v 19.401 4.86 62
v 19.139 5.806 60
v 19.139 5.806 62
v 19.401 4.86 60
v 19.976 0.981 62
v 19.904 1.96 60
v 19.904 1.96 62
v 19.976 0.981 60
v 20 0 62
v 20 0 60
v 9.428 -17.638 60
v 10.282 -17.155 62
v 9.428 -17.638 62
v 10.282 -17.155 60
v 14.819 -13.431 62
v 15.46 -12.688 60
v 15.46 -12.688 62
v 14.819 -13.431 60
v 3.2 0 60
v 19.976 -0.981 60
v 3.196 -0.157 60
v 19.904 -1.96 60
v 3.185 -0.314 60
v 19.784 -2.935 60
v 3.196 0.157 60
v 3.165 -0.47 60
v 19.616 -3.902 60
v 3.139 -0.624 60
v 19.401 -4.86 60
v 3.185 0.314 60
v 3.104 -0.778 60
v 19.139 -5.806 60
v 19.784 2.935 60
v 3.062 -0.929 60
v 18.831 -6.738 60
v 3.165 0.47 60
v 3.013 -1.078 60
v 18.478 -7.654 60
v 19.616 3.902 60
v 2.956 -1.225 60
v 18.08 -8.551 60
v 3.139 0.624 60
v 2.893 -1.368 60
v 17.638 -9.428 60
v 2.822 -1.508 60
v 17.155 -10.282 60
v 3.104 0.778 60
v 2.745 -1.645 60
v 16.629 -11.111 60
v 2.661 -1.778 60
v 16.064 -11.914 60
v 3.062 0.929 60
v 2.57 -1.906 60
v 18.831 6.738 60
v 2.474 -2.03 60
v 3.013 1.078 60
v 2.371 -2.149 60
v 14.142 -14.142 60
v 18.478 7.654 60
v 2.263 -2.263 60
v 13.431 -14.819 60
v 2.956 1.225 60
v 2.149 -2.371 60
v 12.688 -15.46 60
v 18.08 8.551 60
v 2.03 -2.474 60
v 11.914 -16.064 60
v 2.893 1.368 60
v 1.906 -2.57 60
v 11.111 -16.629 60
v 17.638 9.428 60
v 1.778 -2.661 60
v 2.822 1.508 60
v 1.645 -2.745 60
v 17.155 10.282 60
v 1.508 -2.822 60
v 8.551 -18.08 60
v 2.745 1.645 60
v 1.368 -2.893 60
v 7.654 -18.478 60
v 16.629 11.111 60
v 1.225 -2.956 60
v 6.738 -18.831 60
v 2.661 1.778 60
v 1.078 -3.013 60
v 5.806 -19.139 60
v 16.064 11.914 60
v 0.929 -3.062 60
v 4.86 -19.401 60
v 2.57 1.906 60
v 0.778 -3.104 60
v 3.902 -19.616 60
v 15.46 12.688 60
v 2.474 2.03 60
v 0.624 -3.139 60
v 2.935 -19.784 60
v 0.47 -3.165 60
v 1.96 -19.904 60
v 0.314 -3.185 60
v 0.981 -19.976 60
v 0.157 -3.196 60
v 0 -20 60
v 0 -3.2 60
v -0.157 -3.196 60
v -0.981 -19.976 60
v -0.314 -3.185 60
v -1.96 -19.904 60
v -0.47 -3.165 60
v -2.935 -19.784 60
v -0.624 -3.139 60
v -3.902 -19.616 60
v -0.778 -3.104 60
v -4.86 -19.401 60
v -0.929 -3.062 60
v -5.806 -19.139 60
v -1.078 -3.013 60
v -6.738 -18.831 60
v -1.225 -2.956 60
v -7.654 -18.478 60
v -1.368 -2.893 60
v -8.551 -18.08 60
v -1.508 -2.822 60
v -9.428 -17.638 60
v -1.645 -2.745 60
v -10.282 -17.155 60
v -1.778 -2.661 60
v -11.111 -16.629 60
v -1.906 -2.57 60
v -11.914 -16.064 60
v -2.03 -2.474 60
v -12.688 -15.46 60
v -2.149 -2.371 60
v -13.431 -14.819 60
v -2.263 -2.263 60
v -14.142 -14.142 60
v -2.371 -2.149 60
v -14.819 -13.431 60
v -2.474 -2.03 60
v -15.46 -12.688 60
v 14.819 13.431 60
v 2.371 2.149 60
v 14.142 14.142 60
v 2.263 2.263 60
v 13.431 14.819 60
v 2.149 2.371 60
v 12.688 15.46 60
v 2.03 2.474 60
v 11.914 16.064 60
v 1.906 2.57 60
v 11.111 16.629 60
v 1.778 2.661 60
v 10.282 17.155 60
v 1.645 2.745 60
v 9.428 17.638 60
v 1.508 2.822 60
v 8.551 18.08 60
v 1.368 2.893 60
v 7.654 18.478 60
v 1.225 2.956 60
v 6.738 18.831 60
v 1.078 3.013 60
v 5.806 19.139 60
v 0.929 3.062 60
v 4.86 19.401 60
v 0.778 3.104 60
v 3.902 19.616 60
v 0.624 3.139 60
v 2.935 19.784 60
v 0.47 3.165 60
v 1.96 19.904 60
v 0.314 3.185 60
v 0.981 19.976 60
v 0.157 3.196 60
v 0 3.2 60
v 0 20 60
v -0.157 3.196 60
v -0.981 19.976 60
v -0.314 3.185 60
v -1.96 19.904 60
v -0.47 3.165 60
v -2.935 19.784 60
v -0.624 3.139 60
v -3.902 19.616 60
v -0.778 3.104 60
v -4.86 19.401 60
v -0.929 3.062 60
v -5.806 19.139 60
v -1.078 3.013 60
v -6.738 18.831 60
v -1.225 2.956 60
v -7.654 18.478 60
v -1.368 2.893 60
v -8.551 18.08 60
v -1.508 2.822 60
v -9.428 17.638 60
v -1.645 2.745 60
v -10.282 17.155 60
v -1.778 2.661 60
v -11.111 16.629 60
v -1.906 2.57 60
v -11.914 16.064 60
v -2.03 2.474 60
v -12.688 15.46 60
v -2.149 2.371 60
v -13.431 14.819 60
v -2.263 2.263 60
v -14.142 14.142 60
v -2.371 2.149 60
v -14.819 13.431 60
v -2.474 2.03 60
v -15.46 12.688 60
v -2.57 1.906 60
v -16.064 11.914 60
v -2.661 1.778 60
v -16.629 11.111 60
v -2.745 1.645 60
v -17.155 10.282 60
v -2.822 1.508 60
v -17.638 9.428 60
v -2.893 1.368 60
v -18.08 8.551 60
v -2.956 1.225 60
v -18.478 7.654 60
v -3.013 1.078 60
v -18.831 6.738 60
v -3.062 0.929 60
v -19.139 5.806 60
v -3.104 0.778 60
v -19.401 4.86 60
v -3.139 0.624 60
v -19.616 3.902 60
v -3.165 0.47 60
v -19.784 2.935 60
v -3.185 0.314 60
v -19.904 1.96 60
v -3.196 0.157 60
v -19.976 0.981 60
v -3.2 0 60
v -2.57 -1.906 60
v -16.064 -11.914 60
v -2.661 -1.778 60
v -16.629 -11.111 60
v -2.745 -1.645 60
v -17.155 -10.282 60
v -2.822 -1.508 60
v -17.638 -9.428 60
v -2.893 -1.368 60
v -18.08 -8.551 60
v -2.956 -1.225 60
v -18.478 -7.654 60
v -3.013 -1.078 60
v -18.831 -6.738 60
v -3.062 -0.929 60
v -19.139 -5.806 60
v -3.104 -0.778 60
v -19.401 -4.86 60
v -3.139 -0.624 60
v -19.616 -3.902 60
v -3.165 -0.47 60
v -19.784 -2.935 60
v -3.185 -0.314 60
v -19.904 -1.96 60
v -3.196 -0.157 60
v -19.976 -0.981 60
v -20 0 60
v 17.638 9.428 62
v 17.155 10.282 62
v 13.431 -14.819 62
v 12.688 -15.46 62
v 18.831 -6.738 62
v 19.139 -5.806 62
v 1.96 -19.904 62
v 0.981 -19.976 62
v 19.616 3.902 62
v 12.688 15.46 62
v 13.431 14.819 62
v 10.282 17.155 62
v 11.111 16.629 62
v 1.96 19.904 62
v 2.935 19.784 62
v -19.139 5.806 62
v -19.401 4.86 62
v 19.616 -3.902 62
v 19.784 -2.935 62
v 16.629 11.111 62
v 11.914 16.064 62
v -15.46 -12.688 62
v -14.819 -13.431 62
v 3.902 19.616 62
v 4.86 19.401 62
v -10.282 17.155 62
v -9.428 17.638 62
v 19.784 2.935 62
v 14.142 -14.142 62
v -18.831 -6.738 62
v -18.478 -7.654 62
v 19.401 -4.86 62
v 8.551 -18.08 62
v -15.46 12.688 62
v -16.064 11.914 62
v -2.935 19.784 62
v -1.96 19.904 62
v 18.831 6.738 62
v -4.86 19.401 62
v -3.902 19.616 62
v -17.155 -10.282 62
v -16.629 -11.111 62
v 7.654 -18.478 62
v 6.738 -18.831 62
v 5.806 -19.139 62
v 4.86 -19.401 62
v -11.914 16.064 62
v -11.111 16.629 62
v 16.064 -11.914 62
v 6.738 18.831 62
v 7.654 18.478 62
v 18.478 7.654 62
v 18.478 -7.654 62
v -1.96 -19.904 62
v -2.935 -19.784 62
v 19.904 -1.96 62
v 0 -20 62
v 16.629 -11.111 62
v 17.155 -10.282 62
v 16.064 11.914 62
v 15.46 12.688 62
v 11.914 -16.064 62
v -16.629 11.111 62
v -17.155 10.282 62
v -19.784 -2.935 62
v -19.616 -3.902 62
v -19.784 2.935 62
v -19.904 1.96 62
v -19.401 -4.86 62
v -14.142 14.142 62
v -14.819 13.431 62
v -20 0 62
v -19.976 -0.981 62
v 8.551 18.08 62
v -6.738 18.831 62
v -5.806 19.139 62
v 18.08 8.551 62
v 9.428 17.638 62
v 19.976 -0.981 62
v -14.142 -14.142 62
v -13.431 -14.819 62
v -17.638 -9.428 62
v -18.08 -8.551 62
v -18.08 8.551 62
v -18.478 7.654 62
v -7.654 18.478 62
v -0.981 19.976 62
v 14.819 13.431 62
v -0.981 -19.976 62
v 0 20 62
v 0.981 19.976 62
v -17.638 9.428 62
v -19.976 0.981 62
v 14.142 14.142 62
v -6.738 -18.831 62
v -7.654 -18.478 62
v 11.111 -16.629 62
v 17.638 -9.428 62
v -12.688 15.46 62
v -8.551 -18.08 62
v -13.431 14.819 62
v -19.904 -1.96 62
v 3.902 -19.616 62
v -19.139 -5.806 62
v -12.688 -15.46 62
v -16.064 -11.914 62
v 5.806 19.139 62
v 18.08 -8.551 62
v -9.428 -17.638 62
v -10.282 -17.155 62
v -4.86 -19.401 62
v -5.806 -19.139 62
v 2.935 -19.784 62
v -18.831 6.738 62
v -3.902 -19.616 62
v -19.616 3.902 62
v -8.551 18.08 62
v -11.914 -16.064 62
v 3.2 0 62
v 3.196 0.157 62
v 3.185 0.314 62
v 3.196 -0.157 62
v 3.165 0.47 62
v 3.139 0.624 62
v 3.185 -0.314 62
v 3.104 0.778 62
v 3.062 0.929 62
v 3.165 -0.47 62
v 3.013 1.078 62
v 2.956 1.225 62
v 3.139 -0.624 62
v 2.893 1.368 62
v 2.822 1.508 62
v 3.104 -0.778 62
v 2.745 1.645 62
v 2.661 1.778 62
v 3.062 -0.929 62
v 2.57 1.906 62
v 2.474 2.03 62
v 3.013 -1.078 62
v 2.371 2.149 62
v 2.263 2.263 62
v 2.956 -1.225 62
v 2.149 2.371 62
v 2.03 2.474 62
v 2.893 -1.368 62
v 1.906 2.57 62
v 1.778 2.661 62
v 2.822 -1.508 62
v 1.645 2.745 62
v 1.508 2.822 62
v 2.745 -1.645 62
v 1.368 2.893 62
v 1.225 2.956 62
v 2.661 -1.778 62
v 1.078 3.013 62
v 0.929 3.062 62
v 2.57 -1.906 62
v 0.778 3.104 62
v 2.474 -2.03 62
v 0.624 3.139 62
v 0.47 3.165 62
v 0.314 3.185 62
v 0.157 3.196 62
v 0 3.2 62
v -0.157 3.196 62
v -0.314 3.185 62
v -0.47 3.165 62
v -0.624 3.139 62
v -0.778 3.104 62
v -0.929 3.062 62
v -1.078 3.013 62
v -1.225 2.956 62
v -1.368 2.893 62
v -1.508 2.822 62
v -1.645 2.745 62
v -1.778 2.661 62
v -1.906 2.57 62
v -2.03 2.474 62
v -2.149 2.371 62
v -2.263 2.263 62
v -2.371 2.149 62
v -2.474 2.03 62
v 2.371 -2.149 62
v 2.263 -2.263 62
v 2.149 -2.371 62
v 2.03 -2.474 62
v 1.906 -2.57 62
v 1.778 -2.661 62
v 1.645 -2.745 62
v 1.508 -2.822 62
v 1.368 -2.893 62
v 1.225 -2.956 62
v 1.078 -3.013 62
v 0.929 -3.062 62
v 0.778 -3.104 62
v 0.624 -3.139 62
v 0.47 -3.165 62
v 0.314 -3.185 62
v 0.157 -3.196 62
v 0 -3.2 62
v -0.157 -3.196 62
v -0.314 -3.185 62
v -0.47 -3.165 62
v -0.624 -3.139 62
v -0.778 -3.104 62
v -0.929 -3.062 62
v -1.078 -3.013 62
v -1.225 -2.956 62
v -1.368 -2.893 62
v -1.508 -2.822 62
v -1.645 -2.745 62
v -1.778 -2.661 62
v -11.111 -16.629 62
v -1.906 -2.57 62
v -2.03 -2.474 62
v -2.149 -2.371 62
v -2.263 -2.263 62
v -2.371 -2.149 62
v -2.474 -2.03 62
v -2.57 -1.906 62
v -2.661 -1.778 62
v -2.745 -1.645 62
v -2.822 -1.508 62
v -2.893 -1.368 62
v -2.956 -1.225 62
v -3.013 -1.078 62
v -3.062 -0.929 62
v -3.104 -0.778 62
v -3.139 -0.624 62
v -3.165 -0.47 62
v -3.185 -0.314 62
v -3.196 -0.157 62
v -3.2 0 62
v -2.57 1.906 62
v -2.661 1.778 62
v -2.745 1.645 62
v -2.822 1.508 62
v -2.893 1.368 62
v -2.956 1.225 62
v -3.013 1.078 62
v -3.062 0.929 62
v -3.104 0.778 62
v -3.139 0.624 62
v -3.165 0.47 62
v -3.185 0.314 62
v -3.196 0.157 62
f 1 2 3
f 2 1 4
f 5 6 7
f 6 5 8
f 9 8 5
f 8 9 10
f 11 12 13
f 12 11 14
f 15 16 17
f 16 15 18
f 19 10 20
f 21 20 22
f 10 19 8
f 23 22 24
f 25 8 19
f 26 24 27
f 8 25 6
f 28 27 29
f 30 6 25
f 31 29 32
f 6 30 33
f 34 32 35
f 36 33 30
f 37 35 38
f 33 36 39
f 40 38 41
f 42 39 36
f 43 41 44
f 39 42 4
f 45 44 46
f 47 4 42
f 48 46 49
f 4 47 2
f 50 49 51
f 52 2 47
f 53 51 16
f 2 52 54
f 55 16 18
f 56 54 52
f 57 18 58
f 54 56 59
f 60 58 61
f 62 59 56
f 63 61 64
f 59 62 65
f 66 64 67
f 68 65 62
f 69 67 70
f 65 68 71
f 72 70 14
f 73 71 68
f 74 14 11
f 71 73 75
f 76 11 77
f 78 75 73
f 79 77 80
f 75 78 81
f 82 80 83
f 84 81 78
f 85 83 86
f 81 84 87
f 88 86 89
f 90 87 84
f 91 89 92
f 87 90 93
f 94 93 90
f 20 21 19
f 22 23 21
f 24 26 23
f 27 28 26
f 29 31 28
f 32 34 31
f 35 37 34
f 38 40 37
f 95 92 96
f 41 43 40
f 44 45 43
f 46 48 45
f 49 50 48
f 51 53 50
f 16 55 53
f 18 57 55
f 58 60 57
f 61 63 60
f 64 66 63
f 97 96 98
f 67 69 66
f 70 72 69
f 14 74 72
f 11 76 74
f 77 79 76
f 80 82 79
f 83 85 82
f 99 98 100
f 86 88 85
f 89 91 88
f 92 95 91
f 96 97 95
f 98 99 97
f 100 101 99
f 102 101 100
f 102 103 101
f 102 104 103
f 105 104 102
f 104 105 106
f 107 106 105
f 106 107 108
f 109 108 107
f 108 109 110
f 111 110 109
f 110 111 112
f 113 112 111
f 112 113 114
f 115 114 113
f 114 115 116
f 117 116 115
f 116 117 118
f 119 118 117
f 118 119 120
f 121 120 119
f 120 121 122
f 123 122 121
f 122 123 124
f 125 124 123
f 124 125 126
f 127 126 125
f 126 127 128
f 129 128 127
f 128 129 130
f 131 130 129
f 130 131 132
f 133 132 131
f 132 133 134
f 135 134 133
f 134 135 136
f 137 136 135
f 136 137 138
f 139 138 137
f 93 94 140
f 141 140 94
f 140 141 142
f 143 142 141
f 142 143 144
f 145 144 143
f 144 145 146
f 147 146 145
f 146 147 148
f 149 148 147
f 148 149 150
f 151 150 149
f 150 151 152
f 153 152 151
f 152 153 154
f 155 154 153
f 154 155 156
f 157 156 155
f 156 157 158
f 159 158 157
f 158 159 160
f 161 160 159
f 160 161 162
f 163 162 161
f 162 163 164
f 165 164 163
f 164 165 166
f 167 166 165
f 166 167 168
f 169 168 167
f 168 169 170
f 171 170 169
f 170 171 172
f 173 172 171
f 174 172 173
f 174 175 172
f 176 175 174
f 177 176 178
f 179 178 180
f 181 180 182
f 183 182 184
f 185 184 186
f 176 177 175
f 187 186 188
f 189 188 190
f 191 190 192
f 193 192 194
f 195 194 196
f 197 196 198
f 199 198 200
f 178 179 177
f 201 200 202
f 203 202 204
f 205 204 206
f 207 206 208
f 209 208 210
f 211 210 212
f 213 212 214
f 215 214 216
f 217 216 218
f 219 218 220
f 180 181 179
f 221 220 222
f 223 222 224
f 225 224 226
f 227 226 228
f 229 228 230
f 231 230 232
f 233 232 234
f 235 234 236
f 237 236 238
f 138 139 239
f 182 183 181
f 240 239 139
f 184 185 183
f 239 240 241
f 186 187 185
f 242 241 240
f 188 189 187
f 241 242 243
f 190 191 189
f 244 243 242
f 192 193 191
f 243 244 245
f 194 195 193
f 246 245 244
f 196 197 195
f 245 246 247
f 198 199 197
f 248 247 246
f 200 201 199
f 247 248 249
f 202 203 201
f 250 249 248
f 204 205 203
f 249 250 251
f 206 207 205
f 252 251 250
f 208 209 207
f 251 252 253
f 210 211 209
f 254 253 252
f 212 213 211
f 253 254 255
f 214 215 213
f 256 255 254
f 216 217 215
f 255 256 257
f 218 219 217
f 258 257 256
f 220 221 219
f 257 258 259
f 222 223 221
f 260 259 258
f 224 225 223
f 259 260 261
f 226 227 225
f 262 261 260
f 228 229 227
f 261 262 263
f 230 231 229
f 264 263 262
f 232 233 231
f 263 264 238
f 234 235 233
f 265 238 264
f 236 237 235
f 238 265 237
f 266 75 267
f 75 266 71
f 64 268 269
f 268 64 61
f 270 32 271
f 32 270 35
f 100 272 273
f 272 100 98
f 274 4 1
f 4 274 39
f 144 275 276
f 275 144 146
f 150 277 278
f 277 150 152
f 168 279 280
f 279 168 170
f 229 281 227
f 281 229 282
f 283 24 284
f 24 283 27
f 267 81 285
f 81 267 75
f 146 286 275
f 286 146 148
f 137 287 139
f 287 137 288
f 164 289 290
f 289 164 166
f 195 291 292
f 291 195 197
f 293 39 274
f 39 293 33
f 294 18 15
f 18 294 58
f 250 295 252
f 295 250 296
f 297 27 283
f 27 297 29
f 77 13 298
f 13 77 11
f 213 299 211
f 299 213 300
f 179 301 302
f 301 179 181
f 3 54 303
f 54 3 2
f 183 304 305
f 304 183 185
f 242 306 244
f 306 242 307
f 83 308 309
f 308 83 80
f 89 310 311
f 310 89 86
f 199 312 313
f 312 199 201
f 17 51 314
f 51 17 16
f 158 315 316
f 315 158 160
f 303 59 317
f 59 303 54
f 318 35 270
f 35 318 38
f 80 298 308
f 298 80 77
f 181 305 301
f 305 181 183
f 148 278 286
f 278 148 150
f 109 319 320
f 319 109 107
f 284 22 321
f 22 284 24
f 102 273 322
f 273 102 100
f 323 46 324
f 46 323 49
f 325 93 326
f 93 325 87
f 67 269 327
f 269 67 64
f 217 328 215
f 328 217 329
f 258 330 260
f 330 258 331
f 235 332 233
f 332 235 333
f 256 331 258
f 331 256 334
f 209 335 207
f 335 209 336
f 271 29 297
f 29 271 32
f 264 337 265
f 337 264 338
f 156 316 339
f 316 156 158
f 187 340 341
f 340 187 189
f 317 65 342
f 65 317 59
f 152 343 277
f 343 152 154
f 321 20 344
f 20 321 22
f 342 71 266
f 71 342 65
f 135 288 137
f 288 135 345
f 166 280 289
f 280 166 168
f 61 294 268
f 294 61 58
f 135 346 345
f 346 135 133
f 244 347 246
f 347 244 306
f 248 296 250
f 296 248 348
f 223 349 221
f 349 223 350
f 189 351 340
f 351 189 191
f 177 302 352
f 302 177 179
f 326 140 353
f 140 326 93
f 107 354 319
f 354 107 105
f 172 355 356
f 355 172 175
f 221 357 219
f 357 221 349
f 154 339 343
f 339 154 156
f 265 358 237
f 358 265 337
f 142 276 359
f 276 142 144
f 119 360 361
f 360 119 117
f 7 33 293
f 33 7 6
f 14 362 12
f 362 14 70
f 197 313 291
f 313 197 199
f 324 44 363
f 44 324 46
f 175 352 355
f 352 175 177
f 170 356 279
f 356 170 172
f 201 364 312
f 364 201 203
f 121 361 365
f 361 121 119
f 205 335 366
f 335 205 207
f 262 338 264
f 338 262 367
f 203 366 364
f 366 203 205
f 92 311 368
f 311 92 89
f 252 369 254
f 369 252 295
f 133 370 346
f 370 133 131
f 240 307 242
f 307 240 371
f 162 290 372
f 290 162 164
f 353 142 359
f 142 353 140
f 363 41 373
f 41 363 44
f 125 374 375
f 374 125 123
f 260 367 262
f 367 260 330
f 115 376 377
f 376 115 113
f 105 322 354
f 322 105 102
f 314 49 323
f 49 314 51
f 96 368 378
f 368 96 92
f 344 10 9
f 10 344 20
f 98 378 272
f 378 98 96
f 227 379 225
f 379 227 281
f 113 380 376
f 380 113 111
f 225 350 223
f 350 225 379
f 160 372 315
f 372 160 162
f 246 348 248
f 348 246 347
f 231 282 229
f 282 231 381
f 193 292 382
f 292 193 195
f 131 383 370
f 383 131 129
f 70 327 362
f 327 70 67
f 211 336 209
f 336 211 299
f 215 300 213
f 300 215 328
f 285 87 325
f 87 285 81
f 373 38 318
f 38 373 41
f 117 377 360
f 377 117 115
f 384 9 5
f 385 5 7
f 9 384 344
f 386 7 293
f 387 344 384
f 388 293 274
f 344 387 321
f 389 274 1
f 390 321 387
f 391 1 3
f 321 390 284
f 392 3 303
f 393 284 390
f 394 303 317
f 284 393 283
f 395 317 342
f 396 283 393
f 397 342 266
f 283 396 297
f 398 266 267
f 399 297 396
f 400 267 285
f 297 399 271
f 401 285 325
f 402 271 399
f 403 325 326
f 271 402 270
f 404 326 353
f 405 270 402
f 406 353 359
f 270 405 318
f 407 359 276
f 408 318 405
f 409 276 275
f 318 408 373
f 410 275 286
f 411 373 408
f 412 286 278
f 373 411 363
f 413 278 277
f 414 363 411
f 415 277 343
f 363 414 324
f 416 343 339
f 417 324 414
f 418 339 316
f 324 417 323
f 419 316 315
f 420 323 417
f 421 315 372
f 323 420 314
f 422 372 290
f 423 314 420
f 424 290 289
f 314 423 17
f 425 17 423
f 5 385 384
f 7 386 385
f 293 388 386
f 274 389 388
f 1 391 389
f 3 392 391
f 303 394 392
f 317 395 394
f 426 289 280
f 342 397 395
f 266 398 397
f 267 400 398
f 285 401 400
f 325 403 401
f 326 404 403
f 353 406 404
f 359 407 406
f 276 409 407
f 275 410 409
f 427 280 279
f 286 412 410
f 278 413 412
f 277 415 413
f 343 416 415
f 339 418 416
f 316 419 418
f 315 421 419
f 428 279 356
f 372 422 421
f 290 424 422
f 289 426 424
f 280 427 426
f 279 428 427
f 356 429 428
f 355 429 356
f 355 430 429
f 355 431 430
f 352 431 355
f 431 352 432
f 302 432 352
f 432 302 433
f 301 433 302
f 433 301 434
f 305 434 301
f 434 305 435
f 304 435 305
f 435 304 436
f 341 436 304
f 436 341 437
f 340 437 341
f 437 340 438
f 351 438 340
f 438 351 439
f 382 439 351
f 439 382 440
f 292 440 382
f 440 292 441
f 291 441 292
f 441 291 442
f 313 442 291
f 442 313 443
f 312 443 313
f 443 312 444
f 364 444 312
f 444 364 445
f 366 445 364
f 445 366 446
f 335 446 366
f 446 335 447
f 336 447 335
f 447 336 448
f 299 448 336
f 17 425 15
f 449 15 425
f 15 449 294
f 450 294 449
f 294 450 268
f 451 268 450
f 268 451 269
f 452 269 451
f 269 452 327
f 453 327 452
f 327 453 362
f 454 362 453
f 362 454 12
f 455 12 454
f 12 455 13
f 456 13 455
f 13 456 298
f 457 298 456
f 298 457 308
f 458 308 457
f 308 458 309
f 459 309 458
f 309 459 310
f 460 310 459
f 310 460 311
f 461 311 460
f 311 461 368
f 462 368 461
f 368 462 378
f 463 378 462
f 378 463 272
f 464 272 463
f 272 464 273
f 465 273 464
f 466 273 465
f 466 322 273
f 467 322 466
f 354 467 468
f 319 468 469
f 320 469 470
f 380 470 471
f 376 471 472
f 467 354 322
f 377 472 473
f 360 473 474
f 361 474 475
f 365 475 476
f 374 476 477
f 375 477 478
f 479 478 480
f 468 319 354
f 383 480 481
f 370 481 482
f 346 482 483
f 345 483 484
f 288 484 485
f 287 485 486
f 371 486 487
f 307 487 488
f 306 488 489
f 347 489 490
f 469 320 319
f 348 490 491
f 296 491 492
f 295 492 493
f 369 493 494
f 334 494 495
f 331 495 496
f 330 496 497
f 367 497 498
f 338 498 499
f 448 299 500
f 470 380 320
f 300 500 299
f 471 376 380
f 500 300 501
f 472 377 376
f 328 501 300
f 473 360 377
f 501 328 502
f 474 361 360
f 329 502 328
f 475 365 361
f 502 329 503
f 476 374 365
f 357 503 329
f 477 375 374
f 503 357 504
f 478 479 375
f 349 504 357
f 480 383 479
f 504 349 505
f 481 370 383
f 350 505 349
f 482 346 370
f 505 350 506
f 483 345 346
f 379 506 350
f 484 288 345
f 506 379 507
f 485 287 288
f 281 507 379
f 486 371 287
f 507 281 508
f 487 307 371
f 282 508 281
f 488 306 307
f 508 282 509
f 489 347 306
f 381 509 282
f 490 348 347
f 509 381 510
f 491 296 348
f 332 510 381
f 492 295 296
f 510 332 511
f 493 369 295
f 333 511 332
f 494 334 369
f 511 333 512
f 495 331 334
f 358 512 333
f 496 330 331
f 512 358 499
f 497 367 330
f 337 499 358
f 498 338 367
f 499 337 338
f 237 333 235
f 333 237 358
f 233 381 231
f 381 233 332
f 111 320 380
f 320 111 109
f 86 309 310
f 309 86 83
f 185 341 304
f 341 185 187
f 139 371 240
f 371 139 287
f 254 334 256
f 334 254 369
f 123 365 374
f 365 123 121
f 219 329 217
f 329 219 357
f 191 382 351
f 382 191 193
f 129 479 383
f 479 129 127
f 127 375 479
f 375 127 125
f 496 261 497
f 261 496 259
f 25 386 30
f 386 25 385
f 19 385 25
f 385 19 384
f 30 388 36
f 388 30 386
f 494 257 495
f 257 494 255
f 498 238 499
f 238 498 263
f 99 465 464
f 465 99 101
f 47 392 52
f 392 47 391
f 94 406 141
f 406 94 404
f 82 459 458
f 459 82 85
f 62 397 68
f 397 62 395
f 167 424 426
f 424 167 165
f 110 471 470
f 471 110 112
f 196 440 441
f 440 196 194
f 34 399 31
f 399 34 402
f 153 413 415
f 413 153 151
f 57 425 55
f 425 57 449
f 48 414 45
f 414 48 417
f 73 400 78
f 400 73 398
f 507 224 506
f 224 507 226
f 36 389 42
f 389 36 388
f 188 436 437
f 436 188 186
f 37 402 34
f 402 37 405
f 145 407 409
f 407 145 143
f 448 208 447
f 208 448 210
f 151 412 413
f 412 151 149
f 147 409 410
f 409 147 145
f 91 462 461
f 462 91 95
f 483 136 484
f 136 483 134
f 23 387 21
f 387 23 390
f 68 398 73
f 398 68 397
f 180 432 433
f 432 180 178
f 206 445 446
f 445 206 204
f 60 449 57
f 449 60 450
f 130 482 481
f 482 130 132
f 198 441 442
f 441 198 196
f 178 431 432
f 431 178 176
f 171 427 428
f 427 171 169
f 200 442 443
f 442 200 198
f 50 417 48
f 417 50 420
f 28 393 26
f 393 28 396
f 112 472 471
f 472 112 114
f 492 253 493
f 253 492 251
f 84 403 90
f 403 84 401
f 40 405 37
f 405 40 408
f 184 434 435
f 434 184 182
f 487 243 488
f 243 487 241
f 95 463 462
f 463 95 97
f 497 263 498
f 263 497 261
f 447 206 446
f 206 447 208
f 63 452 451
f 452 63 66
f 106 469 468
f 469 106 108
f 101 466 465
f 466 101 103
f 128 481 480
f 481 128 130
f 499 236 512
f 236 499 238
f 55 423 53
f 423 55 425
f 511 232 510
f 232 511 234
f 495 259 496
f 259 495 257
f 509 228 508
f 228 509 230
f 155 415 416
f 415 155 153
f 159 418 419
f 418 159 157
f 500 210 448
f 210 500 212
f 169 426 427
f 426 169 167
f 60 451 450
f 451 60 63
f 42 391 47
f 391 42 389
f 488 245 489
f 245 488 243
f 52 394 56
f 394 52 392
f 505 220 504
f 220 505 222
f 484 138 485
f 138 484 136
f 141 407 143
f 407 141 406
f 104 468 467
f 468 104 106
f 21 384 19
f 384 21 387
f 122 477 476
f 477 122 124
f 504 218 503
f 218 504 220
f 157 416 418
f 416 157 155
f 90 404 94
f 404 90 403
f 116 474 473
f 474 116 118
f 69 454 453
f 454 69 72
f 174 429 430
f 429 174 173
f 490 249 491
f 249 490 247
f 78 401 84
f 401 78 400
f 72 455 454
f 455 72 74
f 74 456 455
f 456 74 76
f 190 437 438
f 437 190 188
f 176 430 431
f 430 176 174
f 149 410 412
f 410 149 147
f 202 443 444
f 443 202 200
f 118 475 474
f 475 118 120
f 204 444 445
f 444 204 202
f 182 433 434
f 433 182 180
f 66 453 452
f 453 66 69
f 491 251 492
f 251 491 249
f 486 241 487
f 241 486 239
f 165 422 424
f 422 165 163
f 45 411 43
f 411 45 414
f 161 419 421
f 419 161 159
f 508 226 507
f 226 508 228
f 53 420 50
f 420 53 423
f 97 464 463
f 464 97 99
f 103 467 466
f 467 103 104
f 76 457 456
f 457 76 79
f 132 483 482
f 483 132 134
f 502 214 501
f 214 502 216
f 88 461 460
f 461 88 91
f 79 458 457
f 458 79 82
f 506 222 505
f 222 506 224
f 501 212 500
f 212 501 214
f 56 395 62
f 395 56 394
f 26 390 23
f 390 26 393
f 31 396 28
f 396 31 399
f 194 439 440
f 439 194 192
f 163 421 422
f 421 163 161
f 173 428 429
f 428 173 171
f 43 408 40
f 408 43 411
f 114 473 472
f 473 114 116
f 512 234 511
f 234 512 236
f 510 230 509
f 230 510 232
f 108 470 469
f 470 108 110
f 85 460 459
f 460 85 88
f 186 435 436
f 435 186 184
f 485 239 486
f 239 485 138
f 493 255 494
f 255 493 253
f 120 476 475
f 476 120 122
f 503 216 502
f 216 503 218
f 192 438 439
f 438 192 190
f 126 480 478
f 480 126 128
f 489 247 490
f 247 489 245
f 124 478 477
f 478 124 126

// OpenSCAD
// file: common_params.scad
cylinder_radius = 20.000000;
cylinder_height = 60.000000;
wall_thickness = 2.000000;

cap_thickness = 2.000000;

rod_radius = 2.000000;
rod_height = 50.000000;

ring_outer_radius = 8.000000;
ring_inner_radius = 4.000000;
ring_thickness = 3.000000;
ring_z = 40.000000;

$fn = 128;
// main file
include <common_params.scad>;

hole_radius = 3.200000;

translate([0, 0, cylinder_height])
difference() {
    cylinder(h = cap_thickness, r = cylinder_radius);
    translate([0, 0, -0.1])
        cylinder(h = cap_thickness + 0.2, r = hole_radius);
}
